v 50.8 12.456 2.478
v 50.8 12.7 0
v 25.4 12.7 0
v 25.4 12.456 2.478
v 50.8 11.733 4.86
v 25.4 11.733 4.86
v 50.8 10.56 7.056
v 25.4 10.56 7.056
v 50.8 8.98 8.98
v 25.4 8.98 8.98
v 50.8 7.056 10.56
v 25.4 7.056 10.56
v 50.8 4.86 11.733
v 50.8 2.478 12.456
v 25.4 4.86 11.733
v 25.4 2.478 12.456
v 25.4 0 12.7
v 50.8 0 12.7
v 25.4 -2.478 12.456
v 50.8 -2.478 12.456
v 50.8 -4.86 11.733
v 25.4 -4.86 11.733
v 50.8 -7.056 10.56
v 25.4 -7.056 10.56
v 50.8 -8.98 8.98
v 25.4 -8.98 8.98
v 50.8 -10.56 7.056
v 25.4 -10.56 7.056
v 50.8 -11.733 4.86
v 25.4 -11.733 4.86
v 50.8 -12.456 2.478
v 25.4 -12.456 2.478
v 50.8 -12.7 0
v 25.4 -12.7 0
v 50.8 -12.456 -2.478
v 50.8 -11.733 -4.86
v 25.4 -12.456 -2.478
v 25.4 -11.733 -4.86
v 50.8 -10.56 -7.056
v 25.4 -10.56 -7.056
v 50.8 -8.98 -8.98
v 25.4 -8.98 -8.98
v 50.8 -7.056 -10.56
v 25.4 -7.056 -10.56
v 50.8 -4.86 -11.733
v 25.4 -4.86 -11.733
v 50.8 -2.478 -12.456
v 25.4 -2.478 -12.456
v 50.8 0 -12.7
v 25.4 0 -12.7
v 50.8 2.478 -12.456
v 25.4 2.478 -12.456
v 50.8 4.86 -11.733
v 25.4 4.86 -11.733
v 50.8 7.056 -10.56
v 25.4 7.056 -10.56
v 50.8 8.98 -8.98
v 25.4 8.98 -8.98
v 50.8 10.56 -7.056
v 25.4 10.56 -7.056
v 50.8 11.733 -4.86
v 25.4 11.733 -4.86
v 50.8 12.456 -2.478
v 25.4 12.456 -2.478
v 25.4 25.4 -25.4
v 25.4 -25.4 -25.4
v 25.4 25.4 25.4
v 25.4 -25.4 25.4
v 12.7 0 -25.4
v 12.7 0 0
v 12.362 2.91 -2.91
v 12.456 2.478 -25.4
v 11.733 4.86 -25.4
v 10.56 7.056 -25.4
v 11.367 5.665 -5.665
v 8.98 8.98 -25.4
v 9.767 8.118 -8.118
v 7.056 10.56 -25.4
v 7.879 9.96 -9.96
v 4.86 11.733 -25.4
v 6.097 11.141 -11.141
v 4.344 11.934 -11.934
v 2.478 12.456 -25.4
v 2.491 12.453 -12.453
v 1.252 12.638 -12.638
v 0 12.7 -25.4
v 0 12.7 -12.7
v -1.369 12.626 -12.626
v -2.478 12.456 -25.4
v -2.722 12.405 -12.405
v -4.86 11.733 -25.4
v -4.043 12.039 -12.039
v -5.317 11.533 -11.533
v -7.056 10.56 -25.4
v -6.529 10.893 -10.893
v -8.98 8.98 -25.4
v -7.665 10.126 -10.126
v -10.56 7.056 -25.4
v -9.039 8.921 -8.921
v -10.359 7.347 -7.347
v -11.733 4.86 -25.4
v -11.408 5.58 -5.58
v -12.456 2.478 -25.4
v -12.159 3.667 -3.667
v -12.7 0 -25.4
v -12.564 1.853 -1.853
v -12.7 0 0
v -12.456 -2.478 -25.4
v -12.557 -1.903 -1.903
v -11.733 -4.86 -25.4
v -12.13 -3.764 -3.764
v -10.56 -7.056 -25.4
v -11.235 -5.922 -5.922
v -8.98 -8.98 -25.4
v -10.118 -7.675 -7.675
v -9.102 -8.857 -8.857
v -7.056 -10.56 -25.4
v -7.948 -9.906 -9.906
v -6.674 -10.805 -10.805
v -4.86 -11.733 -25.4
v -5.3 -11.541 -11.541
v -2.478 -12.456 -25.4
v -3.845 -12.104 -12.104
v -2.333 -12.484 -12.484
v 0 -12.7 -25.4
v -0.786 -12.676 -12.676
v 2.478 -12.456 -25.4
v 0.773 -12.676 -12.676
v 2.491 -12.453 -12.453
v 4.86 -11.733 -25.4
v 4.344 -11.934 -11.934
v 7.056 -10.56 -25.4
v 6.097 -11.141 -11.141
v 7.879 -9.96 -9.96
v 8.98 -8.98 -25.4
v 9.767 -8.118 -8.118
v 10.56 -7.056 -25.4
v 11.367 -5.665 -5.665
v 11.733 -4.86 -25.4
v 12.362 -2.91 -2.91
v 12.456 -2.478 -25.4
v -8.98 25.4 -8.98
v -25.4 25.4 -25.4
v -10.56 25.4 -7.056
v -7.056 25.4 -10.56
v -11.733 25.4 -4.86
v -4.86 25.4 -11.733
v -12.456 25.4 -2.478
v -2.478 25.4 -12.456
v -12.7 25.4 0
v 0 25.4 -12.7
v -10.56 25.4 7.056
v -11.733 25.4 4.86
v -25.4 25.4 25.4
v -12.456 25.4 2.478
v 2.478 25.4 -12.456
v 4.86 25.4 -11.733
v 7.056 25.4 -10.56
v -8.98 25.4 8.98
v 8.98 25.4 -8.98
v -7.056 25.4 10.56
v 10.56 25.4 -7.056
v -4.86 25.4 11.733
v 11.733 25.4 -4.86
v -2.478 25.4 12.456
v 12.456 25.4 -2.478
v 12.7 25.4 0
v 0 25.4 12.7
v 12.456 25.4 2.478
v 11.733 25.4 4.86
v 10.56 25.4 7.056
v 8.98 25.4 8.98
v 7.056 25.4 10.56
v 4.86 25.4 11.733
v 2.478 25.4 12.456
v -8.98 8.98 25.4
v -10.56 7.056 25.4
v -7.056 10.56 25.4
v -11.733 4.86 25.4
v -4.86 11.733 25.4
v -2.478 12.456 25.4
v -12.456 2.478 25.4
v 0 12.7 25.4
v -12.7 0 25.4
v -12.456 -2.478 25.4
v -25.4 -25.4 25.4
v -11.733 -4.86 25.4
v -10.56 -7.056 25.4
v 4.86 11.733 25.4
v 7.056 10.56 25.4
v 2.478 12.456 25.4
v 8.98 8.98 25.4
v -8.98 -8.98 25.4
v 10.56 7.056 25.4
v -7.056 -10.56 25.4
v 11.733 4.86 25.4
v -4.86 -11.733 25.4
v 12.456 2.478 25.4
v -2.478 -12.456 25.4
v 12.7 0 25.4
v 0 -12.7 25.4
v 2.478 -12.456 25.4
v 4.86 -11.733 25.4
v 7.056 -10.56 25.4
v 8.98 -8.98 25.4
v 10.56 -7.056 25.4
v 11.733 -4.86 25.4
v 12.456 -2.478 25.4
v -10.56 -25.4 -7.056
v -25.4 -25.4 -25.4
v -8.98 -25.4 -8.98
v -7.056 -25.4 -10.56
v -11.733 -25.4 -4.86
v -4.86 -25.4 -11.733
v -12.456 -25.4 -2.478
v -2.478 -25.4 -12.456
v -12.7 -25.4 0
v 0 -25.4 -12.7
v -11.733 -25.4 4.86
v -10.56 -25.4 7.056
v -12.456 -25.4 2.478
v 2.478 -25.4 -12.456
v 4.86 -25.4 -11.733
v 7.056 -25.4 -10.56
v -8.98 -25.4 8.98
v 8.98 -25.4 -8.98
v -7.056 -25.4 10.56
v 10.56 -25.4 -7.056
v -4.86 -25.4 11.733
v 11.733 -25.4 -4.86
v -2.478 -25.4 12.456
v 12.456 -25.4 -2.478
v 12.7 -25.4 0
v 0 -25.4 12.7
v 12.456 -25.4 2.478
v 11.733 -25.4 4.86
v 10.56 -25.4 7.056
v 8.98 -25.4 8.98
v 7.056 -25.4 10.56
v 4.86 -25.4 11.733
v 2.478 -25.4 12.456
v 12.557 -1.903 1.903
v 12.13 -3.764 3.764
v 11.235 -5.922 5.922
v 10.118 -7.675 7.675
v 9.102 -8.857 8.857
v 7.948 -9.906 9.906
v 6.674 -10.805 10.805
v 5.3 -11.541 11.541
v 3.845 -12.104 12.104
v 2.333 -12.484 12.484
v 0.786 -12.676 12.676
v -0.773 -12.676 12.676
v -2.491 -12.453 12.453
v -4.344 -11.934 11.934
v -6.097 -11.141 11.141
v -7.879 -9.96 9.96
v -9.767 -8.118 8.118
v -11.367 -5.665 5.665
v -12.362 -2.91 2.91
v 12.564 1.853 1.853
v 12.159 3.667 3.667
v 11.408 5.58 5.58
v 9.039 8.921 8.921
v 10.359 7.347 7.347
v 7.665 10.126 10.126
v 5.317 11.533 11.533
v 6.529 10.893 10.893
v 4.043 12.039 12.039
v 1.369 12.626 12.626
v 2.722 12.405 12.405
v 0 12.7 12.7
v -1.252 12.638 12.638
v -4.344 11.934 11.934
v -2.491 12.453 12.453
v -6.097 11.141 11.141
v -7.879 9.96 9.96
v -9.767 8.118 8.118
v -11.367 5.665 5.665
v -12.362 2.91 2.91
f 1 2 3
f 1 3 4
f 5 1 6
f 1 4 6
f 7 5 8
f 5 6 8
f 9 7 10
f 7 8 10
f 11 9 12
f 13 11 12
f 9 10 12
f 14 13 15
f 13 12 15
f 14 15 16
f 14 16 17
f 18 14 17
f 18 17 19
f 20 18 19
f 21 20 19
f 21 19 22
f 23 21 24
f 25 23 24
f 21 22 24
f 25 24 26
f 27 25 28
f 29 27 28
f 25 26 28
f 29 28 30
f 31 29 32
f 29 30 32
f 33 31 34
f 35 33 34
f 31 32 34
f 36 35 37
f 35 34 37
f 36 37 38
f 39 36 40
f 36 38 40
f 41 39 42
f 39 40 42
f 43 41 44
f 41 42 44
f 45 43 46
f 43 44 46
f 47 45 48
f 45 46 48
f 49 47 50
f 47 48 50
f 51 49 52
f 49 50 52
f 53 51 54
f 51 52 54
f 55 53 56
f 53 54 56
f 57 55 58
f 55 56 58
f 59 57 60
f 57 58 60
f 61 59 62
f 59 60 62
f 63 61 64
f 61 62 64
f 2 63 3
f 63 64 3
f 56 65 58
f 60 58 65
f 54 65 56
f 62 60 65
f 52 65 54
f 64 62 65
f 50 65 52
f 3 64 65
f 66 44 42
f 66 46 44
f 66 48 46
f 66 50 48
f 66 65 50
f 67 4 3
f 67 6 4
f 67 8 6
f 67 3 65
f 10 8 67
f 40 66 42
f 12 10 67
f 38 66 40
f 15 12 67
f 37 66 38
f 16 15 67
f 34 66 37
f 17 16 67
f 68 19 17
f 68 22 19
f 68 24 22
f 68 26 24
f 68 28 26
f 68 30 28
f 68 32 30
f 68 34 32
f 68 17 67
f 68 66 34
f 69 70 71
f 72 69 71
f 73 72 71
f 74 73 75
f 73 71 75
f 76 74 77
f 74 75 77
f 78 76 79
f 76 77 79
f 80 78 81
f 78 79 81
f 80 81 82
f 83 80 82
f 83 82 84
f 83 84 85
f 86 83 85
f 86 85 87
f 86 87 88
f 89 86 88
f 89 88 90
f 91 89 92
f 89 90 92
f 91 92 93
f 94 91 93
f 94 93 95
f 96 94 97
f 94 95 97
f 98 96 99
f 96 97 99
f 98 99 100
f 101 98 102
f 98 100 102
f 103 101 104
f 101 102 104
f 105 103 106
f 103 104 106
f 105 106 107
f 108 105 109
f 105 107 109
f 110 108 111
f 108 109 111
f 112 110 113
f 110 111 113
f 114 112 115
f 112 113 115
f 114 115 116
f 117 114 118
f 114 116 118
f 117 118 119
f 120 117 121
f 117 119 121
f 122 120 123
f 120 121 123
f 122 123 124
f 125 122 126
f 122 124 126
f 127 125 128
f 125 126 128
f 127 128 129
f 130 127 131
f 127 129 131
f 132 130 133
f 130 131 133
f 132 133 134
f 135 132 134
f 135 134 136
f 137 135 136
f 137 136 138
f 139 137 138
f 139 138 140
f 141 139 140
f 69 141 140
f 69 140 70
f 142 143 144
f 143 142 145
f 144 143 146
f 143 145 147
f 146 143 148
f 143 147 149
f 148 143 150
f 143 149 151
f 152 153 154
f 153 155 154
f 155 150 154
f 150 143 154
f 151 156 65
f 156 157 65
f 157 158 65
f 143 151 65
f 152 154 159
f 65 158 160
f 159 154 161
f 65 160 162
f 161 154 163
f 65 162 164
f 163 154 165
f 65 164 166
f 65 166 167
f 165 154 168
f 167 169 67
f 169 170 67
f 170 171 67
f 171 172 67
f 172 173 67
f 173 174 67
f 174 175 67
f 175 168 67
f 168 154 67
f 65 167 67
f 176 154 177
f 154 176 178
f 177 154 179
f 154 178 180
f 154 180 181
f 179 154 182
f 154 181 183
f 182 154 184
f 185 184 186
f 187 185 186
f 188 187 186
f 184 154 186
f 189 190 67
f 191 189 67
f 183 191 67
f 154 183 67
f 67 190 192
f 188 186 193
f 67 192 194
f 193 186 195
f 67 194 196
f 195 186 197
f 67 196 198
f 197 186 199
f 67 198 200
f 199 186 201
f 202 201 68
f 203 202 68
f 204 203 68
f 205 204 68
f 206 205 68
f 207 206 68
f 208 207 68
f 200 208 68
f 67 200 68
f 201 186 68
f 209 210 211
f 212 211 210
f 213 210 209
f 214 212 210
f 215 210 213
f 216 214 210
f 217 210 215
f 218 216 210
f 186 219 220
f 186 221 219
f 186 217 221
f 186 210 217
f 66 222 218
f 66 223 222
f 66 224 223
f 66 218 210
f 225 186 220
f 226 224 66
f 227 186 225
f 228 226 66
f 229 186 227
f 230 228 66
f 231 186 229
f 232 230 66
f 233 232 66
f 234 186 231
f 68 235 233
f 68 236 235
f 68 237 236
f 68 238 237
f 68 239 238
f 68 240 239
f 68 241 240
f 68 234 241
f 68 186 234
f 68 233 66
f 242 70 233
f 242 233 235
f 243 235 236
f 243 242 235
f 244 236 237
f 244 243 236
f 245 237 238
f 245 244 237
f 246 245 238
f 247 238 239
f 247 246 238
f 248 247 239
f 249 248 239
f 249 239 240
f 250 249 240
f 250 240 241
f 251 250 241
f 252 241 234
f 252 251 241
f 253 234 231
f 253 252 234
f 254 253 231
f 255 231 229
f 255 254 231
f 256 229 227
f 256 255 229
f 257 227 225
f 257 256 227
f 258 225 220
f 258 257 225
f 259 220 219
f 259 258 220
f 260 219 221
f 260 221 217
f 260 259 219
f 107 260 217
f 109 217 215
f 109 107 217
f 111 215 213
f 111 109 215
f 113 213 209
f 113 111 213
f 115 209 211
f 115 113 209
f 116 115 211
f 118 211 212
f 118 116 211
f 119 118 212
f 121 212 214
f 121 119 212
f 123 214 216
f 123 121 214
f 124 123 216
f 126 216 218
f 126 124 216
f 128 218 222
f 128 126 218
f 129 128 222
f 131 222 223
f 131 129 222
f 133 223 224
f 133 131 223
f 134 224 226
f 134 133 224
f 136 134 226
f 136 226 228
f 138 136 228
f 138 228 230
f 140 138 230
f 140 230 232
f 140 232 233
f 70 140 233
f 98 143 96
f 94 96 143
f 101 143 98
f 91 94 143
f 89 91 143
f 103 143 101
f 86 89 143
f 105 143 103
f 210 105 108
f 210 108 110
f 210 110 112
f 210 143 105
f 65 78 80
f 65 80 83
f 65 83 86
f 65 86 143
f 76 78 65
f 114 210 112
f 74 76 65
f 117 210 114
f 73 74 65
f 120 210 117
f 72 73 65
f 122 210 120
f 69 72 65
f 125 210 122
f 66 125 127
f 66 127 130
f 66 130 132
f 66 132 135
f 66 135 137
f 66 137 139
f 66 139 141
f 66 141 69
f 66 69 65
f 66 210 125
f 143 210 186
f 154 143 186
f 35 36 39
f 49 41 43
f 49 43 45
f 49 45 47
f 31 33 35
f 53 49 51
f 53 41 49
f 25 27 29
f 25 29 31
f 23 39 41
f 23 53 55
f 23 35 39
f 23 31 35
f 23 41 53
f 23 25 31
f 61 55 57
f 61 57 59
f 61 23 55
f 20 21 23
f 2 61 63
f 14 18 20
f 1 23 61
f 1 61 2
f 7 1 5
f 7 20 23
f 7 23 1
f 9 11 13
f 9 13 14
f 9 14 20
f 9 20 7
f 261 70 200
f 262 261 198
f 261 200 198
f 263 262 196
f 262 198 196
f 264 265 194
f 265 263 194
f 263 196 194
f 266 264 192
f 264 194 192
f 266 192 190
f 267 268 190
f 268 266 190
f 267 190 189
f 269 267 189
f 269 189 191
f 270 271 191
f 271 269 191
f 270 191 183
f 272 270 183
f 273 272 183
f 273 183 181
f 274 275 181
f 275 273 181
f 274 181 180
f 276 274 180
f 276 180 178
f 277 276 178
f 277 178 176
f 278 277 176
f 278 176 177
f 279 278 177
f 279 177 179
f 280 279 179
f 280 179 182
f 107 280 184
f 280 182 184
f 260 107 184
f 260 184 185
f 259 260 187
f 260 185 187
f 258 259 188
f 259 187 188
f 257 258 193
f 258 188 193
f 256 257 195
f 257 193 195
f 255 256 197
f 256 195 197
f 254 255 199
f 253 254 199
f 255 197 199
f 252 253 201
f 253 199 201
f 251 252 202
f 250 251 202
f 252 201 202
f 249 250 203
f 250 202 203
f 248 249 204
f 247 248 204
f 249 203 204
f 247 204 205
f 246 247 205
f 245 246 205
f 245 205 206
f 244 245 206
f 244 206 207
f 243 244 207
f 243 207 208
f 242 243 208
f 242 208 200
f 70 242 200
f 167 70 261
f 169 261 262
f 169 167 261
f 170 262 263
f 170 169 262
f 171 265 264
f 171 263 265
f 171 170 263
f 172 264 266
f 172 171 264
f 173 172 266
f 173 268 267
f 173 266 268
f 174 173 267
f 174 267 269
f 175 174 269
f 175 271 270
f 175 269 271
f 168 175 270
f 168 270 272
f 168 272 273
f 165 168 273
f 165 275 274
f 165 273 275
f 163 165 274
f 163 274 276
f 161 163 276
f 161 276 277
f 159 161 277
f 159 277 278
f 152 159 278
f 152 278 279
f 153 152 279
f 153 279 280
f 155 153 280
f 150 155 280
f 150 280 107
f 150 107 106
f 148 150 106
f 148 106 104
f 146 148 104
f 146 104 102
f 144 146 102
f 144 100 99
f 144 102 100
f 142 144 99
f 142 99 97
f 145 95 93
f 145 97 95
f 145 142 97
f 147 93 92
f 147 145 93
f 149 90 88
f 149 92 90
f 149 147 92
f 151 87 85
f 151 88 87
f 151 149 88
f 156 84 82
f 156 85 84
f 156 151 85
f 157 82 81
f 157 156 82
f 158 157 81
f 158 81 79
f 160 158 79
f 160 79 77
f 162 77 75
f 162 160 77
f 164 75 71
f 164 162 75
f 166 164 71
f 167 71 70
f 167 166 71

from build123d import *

# Parameters (mm, degrees)
F0_W     = 50.8
F0_H     = 50.8
F0_R     = 12.7
F1_DEPTH = 25.4
F2_R     = 12.7
F3_DEPTH = 50.801
F4_R     = 12.7
F5_DEPTH = 25.4


with BuildPart() as f1:
    # F0 (on Front) → F1 (new body, symmetric)
    with BuildSketch(Plane.XZ):
        Rectangle(F0_W, F0_H)
        Circle(F0_R, mode=Mode.SUBTRACT)
    extrude(amount=F1_DEPTH, both=True)

    # F2 (on face) → F3 (cut, through all)
    with BuildSketch(Plane.XY.offset(25.4)):
        Circle(F2_R)
    extrude(amount=-F3_DEPTH, mode=Mode.SUBTRACT)

    # F4 (on face) → F5 (join)
    with BuildSketch(Plane.YZ.offset(25.4)):
        Circle(F4_R)
    extrude(amount=F5_DEPTH)


solid = f1.part
